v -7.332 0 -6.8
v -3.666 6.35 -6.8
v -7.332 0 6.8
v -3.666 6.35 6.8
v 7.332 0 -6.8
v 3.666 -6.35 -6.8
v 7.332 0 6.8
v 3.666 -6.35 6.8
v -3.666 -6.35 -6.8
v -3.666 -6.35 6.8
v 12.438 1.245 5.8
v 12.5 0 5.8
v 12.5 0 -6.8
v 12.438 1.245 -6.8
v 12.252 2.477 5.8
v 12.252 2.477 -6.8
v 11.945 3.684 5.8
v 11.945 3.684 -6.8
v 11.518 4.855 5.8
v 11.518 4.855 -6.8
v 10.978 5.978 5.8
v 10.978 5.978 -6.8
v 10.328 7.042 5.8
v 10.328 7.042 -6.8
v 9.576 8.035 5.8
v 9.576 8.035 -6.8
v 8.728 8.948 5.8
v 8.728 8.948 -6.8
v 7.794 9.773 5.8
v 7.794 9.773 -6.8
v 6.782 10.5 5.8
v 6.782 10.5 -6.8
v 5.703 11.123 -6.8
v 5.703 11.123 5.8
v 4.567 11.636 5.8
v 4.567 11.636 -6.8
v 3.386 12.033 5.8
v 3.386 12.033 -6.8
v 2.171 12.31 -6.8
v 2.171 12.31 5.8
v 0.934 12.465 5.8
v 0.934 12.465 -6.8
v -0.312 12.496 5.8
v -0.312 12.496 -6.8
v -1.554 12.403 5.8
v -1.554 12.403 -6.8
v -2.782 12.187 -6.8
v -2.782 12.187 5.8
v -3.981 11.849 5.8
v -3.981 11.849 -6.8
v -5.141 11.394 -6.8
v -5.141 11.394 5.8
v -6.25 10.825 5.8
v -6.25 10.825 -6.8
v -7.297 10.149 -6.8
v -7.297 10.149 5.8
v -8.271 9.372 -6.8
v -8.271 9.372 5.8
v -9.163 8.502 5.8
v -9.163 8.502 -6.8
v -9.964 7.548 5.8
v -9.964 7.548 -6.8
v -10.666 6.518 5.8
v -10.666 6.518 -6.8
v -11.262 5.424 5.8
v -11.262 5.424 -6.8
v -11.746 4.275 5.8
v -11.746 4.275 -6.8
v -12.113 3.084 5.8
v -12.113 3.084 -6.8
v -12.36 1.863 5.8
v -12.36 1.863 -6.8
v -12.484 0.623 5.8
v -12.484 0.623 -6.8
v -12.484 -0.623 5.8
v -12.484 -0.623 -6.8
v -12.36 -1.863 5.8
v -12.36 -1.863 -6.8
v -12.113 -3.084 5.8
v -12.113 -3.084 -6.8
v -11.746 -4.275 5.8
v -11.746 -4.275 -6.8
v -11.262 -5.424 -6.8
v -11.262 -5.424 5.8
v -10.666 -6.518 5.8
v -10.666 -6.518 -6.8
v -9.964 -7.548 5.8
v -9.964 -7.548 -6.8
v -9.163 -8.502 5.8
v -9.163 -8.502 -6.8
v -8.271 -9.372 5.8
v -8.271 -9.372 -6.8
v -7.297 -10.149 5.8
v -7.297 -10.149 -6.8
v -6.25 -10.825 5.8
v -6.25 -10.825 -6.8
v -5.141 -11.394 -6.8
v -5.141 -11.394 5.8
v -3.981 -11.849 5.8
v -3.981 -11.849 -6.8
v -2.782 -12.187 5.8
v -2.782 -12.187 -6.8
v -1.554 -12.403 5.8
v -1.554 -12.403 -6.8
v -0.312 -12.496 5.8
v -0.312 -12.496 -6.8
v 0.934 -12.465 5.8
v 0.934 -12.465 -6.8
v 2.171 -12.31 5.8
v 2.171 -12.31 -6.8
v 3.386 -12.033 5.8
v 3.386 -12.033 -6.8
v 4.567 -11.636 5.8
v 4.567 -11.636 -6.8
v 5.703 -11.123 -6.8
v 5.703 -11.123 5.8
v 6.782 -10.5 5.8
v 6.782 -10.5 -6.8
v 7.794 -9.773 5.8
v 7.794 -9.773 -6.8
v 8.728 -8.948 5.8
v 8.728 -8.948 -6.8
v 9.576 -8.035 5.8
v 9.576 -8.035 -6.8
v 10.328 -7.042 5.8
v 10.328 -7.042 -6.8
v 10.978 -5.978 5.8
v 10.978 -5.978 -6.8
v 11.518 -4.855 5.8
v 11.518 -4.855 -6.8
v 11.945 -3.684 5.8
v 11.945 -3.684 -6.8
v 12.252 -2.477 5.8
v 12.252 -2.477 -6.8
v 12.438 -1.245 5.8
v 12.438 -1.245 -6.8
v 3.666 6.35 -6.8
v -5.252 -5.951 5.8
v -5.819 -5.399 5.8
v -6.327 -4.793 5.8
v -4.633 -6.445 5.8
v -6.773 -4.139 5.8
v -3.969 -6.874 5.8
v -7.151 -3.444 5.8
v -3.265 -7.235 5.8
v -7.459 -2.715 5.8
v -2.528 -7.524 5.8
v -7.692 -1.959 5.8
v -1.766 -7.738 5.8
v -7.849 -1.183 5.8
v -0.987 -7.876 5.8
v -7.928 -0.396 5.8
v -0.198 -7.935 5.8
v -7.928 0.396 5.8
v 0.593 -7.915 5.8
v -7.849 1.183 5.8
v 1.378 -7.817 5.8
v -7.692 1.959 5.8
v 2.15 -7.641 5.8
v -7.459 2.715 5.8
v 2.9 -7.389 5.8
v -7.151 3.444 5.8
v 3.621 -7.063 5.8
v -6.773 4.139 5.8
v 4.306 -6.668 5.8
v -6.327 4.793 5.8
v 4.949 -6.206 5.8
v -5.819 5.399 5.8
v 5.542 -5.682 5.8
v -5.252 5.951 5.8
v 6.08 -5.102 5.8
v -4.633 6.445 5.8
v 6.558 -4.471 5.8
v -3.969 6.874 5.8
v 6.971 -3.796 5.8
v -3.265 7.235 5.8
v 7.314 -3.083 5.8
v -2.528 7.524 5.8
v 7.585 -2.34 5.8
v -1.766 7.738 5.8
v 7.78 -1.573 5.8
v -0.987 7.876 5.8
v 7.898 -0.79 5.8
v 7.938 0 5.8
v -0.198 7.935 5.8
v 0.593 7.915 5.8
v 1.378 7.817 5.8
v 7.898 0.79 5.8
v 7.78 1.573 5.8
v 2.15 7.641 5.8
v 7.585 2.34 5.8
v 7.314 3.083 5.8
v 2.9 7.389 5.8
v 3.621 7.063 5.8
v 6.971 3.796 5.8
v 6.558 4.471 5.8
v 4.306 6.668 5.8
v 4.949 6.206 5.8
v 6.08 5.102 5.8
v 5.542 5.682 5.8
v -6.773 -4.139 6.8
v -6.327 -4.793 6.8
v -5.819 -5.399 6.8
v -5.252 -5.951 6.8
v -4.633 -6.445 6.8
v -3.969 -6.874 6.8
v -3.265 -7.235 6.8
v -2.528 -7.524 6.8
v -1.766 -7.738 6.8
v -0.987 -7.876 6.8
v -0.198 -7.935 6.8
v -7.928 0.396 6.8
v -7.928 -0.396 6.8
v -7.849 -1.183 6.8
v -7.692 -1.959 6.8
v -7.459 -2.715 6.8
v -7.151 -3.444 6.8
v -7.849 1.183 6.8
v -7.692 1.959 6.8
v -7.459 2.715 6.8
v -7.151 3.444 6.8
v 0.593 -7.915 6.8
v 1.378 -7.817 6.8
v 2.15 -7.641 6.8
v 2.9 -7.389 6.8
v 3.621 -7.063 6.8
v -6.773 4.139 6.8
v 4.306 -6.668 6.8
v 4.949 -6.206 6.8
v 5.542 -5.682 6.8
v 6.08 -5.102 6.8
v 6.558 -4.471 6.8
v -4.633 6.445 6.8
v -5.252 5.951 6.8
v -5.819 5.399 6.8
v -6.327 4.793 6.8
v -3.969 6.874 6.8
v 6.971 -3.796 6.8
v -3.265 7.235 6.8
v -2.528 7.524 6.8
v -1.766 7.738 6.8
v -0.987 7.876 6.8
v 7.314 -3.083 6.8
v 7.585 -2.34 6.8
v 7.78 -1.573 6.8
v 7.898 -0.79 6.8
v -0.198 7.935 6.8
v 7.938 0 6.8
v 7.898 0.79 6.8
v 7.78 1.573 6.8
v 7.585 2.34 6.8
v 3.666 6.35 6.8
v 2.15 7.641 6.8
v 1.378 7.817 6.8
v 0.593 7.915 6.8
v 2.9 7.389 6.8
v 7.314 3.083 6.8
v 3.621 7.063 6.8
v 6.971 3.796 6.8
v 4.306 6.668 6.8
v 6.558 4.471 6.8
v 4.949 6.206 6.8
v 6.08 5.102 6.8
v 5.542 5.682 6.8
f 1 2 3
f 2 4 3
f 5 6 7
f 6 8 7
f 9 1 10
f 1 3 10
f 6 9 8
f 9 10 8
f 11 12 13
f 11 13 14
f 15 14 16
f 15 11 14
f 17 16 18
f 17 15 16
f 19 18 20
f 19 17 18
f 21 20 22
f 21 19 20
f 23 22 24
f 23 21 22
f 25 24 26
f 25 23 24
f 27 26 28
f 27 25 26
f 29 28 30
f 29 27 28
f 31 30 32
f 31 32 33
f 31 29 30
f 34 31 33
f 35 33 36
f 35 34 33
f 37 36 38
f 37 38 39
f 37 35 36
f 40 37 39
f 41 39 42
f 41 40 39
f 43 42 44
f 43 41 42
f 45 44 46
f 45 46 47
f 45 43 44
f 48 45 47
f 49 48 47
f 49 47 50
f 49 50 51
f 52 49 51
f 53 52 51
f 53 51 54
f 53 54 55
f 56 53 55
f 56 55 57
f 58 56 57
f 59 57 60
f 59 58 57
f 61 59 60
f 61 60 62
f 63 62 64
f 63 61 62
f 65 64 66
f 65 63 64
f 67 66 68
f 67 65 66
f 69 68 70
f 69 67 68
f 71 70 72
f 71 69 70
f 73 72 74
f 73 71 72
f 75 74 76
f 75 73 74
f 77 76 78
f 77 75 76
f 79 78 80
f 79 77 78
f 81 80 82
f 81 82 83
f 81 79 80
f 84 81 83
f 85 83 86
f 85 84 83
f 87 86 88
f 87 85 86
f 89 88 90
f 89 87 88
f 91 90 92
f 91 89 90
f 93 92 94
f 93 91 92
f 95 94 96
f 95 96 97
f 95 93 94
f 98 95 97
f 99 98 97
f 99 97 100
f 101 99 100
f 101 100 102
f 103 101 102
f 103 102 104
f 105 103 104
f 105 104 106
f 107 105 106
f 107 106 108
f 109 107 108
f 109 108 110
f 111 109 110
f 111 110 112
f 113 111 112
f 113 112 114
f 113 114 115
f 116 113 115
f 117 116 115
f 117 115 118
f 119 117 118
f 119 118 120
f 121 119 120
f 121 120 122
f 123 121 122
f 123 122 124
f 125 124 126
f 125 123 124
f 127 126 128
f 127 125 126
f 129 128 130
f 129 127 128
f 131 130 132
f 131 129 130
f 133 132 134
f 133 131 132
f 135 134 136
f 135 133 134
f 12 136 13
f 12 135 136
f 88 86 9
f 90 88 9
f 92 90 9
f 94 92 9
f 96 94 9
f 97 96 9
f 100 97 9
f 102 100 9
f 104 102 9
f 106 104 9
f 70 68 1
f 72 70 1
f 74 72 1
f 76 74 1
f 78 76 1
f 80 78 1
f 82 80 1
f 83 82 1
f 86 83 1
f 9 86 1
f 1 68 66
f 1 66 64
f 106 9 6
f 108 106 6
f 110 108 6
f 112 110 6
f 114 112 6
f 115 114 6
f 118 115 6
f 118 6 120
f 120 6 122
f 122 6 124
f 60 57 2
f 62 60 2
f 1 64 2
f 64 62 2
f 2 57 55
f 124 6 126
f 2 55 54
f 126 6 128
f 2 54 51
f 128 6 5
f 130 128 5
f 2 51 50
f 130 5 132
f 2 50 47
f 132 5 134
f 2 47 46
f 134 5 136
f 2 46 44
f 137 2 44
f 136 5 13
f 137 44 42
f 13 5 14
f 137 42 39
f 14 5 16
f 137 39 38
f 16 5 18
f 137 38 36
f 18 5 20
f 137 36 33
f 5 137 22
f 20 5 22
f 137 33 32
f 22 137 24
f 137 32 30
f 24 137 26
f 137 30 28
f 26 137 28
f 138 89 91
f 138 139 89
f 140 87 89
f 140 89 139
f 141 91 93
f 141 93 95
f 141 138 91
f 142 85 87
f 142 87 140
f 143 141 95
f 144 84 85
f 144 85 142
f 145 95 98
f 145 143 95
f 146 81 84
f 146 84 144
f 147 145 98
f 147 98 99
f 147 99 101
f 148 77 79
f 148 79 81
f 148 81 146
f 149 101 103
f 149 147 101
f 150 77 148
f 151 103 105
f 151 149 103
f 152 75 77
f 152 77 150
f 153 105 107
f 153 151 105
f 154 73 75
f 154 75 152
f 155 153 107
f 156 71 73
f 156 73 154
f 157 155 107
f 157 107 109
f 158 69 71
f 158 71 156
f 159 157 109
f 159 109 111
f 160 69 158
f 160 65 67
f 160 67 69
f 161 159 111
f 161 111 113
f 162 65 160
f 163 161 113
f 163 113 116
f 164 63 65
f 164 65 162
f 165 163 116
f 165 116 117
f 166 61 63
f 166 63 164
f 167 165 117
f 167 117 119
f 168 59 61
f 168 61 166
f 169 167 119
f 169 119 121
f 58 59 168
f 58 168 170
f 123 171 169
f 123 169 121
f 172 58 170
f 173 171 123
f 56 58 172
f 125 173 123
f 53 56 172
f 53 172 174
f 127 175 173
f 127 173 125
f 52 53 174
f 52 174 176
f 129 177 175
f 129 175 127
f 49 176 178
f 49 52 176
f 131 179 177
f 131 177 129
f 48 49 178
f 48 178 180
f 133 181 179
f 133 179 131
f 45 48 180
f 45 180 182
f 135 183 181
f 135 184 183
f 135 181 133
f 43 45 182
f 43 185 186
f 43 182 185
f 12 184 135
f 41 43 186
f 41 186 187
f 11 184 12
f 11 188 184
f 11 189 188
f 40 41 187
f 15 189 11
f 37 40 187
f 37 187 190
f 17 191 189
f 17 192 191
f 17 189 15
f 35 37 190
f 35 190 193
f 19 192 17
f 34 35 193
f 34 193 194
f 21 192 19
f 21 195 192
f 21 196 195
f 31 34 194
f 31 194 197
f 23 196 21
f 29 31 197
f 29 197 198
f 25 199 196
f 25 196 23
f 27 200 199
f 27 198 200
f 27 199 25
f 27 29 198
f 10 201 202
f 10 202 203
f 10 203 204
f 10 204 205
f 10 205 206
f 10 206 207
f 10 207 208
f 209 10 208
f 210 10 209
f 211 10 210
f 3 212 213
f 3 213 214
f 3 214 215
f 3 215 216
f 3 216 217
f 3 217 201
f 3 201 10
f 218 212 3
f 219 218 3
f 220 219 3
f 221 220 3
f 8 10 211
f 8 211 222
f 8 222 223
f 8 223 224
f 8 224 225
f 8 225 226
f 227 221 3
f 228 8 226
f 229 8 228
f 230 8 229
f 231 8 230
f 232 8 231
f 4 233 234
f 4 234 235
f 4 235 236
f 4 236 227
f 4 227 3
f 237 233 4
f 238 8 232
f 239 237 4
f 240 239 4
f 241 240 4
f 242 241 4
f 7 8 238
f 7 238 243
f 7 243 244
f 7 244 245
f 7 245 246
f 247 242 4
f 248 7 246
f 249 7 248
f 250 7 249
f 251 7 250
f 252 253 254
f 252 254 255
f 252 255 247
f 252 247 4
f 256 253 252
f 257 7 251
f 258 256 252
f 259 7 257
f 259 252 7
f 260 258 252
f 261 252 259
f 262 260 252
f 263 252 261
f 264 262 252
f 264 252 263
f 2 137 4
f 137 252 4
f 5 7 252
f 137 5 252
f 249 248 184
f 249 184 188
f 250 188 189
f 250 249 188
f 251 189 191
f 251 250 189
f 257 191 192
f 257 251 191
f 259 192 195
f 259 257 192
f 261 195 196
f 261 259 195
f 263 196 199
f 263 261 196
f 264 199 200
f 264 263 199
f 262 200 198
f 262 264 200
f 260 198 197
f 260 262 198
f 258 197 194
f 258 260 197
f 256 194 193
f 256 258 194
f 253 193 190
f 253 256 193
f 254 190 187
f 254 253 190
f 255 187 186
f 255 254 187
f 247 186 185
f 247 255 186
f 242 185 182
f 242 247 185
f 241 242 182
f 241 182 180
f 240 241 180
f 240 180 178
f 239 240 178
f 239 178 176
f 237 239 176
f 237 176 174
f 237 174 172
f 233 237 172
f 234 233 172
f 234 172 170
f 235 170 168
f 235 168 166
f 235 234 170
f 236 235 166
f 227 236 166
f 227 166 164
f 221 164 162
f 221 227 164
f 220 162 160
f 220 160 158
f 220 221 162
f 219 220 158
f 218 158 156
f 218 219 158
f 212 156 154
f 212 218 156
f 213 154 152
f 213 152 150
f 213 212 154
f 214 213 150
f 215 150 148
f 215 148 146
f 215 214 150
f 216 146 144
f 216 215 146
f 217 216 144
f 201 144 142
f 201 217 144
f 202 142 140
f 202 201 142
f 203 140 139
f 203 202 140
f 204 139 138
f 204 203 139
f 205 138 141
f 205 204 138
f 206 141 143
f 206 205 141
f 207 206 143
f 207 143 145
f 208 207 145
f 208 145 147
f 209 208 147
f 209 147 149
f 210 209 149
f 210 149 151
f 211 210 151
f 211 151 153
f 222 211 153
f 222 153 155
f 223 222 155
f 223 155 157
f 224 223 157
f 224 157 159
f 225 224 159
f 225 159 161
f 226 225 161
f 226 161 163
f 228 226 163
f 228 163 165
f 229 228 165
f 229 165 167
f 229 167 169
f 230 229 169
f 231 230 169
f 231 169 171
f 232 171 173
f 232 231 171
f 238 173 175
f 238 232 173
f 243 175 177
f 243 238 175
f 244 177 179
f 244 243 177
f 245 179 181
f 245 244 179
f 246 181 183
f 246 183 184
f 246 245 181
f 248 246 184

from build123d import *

# Parameters (mm, degrees)
SKETCH1_R           = 12.5
BOSS_EXTRUDE1_DEPTH = 6.8
SKETCH2_R           = 12.5
SKETCH2_R_2         = 7.9375
CUT_EXTRUDE1_DEPTH  = 1


with BuildPart() as part:
    # Sketch1 → Boss-Extrude1 (new, symmetric)
    with BuildSketch(Plane.XY):
        Circle(SKETCH1_R)
        Polygon((7.332348419, 0), (3.666174209, 6.35), (-3.666174209, 6.35), (-7.332348419, 0), (-3.666174209, -6.35), (3.666174209, -6.35), align=None, mode=Mode.SUBTRACT)
    extrude(amount=BOSS_EXTRUDE1_DEPTH, both=True)

    # Sketch2 → Cut-Extrude1 (cut)
    with BuildSketch(Plane.XY.offset(6.8)):
        Circle(SKETCH2_R)
        Circle(SKETCH2_R_2, mode=Mode.SUBTRACT)
    extrude(amount=-CUT_EXTRUDE1_DEPTH, mode=Mode.SUBTRACT)


solid = part.part
